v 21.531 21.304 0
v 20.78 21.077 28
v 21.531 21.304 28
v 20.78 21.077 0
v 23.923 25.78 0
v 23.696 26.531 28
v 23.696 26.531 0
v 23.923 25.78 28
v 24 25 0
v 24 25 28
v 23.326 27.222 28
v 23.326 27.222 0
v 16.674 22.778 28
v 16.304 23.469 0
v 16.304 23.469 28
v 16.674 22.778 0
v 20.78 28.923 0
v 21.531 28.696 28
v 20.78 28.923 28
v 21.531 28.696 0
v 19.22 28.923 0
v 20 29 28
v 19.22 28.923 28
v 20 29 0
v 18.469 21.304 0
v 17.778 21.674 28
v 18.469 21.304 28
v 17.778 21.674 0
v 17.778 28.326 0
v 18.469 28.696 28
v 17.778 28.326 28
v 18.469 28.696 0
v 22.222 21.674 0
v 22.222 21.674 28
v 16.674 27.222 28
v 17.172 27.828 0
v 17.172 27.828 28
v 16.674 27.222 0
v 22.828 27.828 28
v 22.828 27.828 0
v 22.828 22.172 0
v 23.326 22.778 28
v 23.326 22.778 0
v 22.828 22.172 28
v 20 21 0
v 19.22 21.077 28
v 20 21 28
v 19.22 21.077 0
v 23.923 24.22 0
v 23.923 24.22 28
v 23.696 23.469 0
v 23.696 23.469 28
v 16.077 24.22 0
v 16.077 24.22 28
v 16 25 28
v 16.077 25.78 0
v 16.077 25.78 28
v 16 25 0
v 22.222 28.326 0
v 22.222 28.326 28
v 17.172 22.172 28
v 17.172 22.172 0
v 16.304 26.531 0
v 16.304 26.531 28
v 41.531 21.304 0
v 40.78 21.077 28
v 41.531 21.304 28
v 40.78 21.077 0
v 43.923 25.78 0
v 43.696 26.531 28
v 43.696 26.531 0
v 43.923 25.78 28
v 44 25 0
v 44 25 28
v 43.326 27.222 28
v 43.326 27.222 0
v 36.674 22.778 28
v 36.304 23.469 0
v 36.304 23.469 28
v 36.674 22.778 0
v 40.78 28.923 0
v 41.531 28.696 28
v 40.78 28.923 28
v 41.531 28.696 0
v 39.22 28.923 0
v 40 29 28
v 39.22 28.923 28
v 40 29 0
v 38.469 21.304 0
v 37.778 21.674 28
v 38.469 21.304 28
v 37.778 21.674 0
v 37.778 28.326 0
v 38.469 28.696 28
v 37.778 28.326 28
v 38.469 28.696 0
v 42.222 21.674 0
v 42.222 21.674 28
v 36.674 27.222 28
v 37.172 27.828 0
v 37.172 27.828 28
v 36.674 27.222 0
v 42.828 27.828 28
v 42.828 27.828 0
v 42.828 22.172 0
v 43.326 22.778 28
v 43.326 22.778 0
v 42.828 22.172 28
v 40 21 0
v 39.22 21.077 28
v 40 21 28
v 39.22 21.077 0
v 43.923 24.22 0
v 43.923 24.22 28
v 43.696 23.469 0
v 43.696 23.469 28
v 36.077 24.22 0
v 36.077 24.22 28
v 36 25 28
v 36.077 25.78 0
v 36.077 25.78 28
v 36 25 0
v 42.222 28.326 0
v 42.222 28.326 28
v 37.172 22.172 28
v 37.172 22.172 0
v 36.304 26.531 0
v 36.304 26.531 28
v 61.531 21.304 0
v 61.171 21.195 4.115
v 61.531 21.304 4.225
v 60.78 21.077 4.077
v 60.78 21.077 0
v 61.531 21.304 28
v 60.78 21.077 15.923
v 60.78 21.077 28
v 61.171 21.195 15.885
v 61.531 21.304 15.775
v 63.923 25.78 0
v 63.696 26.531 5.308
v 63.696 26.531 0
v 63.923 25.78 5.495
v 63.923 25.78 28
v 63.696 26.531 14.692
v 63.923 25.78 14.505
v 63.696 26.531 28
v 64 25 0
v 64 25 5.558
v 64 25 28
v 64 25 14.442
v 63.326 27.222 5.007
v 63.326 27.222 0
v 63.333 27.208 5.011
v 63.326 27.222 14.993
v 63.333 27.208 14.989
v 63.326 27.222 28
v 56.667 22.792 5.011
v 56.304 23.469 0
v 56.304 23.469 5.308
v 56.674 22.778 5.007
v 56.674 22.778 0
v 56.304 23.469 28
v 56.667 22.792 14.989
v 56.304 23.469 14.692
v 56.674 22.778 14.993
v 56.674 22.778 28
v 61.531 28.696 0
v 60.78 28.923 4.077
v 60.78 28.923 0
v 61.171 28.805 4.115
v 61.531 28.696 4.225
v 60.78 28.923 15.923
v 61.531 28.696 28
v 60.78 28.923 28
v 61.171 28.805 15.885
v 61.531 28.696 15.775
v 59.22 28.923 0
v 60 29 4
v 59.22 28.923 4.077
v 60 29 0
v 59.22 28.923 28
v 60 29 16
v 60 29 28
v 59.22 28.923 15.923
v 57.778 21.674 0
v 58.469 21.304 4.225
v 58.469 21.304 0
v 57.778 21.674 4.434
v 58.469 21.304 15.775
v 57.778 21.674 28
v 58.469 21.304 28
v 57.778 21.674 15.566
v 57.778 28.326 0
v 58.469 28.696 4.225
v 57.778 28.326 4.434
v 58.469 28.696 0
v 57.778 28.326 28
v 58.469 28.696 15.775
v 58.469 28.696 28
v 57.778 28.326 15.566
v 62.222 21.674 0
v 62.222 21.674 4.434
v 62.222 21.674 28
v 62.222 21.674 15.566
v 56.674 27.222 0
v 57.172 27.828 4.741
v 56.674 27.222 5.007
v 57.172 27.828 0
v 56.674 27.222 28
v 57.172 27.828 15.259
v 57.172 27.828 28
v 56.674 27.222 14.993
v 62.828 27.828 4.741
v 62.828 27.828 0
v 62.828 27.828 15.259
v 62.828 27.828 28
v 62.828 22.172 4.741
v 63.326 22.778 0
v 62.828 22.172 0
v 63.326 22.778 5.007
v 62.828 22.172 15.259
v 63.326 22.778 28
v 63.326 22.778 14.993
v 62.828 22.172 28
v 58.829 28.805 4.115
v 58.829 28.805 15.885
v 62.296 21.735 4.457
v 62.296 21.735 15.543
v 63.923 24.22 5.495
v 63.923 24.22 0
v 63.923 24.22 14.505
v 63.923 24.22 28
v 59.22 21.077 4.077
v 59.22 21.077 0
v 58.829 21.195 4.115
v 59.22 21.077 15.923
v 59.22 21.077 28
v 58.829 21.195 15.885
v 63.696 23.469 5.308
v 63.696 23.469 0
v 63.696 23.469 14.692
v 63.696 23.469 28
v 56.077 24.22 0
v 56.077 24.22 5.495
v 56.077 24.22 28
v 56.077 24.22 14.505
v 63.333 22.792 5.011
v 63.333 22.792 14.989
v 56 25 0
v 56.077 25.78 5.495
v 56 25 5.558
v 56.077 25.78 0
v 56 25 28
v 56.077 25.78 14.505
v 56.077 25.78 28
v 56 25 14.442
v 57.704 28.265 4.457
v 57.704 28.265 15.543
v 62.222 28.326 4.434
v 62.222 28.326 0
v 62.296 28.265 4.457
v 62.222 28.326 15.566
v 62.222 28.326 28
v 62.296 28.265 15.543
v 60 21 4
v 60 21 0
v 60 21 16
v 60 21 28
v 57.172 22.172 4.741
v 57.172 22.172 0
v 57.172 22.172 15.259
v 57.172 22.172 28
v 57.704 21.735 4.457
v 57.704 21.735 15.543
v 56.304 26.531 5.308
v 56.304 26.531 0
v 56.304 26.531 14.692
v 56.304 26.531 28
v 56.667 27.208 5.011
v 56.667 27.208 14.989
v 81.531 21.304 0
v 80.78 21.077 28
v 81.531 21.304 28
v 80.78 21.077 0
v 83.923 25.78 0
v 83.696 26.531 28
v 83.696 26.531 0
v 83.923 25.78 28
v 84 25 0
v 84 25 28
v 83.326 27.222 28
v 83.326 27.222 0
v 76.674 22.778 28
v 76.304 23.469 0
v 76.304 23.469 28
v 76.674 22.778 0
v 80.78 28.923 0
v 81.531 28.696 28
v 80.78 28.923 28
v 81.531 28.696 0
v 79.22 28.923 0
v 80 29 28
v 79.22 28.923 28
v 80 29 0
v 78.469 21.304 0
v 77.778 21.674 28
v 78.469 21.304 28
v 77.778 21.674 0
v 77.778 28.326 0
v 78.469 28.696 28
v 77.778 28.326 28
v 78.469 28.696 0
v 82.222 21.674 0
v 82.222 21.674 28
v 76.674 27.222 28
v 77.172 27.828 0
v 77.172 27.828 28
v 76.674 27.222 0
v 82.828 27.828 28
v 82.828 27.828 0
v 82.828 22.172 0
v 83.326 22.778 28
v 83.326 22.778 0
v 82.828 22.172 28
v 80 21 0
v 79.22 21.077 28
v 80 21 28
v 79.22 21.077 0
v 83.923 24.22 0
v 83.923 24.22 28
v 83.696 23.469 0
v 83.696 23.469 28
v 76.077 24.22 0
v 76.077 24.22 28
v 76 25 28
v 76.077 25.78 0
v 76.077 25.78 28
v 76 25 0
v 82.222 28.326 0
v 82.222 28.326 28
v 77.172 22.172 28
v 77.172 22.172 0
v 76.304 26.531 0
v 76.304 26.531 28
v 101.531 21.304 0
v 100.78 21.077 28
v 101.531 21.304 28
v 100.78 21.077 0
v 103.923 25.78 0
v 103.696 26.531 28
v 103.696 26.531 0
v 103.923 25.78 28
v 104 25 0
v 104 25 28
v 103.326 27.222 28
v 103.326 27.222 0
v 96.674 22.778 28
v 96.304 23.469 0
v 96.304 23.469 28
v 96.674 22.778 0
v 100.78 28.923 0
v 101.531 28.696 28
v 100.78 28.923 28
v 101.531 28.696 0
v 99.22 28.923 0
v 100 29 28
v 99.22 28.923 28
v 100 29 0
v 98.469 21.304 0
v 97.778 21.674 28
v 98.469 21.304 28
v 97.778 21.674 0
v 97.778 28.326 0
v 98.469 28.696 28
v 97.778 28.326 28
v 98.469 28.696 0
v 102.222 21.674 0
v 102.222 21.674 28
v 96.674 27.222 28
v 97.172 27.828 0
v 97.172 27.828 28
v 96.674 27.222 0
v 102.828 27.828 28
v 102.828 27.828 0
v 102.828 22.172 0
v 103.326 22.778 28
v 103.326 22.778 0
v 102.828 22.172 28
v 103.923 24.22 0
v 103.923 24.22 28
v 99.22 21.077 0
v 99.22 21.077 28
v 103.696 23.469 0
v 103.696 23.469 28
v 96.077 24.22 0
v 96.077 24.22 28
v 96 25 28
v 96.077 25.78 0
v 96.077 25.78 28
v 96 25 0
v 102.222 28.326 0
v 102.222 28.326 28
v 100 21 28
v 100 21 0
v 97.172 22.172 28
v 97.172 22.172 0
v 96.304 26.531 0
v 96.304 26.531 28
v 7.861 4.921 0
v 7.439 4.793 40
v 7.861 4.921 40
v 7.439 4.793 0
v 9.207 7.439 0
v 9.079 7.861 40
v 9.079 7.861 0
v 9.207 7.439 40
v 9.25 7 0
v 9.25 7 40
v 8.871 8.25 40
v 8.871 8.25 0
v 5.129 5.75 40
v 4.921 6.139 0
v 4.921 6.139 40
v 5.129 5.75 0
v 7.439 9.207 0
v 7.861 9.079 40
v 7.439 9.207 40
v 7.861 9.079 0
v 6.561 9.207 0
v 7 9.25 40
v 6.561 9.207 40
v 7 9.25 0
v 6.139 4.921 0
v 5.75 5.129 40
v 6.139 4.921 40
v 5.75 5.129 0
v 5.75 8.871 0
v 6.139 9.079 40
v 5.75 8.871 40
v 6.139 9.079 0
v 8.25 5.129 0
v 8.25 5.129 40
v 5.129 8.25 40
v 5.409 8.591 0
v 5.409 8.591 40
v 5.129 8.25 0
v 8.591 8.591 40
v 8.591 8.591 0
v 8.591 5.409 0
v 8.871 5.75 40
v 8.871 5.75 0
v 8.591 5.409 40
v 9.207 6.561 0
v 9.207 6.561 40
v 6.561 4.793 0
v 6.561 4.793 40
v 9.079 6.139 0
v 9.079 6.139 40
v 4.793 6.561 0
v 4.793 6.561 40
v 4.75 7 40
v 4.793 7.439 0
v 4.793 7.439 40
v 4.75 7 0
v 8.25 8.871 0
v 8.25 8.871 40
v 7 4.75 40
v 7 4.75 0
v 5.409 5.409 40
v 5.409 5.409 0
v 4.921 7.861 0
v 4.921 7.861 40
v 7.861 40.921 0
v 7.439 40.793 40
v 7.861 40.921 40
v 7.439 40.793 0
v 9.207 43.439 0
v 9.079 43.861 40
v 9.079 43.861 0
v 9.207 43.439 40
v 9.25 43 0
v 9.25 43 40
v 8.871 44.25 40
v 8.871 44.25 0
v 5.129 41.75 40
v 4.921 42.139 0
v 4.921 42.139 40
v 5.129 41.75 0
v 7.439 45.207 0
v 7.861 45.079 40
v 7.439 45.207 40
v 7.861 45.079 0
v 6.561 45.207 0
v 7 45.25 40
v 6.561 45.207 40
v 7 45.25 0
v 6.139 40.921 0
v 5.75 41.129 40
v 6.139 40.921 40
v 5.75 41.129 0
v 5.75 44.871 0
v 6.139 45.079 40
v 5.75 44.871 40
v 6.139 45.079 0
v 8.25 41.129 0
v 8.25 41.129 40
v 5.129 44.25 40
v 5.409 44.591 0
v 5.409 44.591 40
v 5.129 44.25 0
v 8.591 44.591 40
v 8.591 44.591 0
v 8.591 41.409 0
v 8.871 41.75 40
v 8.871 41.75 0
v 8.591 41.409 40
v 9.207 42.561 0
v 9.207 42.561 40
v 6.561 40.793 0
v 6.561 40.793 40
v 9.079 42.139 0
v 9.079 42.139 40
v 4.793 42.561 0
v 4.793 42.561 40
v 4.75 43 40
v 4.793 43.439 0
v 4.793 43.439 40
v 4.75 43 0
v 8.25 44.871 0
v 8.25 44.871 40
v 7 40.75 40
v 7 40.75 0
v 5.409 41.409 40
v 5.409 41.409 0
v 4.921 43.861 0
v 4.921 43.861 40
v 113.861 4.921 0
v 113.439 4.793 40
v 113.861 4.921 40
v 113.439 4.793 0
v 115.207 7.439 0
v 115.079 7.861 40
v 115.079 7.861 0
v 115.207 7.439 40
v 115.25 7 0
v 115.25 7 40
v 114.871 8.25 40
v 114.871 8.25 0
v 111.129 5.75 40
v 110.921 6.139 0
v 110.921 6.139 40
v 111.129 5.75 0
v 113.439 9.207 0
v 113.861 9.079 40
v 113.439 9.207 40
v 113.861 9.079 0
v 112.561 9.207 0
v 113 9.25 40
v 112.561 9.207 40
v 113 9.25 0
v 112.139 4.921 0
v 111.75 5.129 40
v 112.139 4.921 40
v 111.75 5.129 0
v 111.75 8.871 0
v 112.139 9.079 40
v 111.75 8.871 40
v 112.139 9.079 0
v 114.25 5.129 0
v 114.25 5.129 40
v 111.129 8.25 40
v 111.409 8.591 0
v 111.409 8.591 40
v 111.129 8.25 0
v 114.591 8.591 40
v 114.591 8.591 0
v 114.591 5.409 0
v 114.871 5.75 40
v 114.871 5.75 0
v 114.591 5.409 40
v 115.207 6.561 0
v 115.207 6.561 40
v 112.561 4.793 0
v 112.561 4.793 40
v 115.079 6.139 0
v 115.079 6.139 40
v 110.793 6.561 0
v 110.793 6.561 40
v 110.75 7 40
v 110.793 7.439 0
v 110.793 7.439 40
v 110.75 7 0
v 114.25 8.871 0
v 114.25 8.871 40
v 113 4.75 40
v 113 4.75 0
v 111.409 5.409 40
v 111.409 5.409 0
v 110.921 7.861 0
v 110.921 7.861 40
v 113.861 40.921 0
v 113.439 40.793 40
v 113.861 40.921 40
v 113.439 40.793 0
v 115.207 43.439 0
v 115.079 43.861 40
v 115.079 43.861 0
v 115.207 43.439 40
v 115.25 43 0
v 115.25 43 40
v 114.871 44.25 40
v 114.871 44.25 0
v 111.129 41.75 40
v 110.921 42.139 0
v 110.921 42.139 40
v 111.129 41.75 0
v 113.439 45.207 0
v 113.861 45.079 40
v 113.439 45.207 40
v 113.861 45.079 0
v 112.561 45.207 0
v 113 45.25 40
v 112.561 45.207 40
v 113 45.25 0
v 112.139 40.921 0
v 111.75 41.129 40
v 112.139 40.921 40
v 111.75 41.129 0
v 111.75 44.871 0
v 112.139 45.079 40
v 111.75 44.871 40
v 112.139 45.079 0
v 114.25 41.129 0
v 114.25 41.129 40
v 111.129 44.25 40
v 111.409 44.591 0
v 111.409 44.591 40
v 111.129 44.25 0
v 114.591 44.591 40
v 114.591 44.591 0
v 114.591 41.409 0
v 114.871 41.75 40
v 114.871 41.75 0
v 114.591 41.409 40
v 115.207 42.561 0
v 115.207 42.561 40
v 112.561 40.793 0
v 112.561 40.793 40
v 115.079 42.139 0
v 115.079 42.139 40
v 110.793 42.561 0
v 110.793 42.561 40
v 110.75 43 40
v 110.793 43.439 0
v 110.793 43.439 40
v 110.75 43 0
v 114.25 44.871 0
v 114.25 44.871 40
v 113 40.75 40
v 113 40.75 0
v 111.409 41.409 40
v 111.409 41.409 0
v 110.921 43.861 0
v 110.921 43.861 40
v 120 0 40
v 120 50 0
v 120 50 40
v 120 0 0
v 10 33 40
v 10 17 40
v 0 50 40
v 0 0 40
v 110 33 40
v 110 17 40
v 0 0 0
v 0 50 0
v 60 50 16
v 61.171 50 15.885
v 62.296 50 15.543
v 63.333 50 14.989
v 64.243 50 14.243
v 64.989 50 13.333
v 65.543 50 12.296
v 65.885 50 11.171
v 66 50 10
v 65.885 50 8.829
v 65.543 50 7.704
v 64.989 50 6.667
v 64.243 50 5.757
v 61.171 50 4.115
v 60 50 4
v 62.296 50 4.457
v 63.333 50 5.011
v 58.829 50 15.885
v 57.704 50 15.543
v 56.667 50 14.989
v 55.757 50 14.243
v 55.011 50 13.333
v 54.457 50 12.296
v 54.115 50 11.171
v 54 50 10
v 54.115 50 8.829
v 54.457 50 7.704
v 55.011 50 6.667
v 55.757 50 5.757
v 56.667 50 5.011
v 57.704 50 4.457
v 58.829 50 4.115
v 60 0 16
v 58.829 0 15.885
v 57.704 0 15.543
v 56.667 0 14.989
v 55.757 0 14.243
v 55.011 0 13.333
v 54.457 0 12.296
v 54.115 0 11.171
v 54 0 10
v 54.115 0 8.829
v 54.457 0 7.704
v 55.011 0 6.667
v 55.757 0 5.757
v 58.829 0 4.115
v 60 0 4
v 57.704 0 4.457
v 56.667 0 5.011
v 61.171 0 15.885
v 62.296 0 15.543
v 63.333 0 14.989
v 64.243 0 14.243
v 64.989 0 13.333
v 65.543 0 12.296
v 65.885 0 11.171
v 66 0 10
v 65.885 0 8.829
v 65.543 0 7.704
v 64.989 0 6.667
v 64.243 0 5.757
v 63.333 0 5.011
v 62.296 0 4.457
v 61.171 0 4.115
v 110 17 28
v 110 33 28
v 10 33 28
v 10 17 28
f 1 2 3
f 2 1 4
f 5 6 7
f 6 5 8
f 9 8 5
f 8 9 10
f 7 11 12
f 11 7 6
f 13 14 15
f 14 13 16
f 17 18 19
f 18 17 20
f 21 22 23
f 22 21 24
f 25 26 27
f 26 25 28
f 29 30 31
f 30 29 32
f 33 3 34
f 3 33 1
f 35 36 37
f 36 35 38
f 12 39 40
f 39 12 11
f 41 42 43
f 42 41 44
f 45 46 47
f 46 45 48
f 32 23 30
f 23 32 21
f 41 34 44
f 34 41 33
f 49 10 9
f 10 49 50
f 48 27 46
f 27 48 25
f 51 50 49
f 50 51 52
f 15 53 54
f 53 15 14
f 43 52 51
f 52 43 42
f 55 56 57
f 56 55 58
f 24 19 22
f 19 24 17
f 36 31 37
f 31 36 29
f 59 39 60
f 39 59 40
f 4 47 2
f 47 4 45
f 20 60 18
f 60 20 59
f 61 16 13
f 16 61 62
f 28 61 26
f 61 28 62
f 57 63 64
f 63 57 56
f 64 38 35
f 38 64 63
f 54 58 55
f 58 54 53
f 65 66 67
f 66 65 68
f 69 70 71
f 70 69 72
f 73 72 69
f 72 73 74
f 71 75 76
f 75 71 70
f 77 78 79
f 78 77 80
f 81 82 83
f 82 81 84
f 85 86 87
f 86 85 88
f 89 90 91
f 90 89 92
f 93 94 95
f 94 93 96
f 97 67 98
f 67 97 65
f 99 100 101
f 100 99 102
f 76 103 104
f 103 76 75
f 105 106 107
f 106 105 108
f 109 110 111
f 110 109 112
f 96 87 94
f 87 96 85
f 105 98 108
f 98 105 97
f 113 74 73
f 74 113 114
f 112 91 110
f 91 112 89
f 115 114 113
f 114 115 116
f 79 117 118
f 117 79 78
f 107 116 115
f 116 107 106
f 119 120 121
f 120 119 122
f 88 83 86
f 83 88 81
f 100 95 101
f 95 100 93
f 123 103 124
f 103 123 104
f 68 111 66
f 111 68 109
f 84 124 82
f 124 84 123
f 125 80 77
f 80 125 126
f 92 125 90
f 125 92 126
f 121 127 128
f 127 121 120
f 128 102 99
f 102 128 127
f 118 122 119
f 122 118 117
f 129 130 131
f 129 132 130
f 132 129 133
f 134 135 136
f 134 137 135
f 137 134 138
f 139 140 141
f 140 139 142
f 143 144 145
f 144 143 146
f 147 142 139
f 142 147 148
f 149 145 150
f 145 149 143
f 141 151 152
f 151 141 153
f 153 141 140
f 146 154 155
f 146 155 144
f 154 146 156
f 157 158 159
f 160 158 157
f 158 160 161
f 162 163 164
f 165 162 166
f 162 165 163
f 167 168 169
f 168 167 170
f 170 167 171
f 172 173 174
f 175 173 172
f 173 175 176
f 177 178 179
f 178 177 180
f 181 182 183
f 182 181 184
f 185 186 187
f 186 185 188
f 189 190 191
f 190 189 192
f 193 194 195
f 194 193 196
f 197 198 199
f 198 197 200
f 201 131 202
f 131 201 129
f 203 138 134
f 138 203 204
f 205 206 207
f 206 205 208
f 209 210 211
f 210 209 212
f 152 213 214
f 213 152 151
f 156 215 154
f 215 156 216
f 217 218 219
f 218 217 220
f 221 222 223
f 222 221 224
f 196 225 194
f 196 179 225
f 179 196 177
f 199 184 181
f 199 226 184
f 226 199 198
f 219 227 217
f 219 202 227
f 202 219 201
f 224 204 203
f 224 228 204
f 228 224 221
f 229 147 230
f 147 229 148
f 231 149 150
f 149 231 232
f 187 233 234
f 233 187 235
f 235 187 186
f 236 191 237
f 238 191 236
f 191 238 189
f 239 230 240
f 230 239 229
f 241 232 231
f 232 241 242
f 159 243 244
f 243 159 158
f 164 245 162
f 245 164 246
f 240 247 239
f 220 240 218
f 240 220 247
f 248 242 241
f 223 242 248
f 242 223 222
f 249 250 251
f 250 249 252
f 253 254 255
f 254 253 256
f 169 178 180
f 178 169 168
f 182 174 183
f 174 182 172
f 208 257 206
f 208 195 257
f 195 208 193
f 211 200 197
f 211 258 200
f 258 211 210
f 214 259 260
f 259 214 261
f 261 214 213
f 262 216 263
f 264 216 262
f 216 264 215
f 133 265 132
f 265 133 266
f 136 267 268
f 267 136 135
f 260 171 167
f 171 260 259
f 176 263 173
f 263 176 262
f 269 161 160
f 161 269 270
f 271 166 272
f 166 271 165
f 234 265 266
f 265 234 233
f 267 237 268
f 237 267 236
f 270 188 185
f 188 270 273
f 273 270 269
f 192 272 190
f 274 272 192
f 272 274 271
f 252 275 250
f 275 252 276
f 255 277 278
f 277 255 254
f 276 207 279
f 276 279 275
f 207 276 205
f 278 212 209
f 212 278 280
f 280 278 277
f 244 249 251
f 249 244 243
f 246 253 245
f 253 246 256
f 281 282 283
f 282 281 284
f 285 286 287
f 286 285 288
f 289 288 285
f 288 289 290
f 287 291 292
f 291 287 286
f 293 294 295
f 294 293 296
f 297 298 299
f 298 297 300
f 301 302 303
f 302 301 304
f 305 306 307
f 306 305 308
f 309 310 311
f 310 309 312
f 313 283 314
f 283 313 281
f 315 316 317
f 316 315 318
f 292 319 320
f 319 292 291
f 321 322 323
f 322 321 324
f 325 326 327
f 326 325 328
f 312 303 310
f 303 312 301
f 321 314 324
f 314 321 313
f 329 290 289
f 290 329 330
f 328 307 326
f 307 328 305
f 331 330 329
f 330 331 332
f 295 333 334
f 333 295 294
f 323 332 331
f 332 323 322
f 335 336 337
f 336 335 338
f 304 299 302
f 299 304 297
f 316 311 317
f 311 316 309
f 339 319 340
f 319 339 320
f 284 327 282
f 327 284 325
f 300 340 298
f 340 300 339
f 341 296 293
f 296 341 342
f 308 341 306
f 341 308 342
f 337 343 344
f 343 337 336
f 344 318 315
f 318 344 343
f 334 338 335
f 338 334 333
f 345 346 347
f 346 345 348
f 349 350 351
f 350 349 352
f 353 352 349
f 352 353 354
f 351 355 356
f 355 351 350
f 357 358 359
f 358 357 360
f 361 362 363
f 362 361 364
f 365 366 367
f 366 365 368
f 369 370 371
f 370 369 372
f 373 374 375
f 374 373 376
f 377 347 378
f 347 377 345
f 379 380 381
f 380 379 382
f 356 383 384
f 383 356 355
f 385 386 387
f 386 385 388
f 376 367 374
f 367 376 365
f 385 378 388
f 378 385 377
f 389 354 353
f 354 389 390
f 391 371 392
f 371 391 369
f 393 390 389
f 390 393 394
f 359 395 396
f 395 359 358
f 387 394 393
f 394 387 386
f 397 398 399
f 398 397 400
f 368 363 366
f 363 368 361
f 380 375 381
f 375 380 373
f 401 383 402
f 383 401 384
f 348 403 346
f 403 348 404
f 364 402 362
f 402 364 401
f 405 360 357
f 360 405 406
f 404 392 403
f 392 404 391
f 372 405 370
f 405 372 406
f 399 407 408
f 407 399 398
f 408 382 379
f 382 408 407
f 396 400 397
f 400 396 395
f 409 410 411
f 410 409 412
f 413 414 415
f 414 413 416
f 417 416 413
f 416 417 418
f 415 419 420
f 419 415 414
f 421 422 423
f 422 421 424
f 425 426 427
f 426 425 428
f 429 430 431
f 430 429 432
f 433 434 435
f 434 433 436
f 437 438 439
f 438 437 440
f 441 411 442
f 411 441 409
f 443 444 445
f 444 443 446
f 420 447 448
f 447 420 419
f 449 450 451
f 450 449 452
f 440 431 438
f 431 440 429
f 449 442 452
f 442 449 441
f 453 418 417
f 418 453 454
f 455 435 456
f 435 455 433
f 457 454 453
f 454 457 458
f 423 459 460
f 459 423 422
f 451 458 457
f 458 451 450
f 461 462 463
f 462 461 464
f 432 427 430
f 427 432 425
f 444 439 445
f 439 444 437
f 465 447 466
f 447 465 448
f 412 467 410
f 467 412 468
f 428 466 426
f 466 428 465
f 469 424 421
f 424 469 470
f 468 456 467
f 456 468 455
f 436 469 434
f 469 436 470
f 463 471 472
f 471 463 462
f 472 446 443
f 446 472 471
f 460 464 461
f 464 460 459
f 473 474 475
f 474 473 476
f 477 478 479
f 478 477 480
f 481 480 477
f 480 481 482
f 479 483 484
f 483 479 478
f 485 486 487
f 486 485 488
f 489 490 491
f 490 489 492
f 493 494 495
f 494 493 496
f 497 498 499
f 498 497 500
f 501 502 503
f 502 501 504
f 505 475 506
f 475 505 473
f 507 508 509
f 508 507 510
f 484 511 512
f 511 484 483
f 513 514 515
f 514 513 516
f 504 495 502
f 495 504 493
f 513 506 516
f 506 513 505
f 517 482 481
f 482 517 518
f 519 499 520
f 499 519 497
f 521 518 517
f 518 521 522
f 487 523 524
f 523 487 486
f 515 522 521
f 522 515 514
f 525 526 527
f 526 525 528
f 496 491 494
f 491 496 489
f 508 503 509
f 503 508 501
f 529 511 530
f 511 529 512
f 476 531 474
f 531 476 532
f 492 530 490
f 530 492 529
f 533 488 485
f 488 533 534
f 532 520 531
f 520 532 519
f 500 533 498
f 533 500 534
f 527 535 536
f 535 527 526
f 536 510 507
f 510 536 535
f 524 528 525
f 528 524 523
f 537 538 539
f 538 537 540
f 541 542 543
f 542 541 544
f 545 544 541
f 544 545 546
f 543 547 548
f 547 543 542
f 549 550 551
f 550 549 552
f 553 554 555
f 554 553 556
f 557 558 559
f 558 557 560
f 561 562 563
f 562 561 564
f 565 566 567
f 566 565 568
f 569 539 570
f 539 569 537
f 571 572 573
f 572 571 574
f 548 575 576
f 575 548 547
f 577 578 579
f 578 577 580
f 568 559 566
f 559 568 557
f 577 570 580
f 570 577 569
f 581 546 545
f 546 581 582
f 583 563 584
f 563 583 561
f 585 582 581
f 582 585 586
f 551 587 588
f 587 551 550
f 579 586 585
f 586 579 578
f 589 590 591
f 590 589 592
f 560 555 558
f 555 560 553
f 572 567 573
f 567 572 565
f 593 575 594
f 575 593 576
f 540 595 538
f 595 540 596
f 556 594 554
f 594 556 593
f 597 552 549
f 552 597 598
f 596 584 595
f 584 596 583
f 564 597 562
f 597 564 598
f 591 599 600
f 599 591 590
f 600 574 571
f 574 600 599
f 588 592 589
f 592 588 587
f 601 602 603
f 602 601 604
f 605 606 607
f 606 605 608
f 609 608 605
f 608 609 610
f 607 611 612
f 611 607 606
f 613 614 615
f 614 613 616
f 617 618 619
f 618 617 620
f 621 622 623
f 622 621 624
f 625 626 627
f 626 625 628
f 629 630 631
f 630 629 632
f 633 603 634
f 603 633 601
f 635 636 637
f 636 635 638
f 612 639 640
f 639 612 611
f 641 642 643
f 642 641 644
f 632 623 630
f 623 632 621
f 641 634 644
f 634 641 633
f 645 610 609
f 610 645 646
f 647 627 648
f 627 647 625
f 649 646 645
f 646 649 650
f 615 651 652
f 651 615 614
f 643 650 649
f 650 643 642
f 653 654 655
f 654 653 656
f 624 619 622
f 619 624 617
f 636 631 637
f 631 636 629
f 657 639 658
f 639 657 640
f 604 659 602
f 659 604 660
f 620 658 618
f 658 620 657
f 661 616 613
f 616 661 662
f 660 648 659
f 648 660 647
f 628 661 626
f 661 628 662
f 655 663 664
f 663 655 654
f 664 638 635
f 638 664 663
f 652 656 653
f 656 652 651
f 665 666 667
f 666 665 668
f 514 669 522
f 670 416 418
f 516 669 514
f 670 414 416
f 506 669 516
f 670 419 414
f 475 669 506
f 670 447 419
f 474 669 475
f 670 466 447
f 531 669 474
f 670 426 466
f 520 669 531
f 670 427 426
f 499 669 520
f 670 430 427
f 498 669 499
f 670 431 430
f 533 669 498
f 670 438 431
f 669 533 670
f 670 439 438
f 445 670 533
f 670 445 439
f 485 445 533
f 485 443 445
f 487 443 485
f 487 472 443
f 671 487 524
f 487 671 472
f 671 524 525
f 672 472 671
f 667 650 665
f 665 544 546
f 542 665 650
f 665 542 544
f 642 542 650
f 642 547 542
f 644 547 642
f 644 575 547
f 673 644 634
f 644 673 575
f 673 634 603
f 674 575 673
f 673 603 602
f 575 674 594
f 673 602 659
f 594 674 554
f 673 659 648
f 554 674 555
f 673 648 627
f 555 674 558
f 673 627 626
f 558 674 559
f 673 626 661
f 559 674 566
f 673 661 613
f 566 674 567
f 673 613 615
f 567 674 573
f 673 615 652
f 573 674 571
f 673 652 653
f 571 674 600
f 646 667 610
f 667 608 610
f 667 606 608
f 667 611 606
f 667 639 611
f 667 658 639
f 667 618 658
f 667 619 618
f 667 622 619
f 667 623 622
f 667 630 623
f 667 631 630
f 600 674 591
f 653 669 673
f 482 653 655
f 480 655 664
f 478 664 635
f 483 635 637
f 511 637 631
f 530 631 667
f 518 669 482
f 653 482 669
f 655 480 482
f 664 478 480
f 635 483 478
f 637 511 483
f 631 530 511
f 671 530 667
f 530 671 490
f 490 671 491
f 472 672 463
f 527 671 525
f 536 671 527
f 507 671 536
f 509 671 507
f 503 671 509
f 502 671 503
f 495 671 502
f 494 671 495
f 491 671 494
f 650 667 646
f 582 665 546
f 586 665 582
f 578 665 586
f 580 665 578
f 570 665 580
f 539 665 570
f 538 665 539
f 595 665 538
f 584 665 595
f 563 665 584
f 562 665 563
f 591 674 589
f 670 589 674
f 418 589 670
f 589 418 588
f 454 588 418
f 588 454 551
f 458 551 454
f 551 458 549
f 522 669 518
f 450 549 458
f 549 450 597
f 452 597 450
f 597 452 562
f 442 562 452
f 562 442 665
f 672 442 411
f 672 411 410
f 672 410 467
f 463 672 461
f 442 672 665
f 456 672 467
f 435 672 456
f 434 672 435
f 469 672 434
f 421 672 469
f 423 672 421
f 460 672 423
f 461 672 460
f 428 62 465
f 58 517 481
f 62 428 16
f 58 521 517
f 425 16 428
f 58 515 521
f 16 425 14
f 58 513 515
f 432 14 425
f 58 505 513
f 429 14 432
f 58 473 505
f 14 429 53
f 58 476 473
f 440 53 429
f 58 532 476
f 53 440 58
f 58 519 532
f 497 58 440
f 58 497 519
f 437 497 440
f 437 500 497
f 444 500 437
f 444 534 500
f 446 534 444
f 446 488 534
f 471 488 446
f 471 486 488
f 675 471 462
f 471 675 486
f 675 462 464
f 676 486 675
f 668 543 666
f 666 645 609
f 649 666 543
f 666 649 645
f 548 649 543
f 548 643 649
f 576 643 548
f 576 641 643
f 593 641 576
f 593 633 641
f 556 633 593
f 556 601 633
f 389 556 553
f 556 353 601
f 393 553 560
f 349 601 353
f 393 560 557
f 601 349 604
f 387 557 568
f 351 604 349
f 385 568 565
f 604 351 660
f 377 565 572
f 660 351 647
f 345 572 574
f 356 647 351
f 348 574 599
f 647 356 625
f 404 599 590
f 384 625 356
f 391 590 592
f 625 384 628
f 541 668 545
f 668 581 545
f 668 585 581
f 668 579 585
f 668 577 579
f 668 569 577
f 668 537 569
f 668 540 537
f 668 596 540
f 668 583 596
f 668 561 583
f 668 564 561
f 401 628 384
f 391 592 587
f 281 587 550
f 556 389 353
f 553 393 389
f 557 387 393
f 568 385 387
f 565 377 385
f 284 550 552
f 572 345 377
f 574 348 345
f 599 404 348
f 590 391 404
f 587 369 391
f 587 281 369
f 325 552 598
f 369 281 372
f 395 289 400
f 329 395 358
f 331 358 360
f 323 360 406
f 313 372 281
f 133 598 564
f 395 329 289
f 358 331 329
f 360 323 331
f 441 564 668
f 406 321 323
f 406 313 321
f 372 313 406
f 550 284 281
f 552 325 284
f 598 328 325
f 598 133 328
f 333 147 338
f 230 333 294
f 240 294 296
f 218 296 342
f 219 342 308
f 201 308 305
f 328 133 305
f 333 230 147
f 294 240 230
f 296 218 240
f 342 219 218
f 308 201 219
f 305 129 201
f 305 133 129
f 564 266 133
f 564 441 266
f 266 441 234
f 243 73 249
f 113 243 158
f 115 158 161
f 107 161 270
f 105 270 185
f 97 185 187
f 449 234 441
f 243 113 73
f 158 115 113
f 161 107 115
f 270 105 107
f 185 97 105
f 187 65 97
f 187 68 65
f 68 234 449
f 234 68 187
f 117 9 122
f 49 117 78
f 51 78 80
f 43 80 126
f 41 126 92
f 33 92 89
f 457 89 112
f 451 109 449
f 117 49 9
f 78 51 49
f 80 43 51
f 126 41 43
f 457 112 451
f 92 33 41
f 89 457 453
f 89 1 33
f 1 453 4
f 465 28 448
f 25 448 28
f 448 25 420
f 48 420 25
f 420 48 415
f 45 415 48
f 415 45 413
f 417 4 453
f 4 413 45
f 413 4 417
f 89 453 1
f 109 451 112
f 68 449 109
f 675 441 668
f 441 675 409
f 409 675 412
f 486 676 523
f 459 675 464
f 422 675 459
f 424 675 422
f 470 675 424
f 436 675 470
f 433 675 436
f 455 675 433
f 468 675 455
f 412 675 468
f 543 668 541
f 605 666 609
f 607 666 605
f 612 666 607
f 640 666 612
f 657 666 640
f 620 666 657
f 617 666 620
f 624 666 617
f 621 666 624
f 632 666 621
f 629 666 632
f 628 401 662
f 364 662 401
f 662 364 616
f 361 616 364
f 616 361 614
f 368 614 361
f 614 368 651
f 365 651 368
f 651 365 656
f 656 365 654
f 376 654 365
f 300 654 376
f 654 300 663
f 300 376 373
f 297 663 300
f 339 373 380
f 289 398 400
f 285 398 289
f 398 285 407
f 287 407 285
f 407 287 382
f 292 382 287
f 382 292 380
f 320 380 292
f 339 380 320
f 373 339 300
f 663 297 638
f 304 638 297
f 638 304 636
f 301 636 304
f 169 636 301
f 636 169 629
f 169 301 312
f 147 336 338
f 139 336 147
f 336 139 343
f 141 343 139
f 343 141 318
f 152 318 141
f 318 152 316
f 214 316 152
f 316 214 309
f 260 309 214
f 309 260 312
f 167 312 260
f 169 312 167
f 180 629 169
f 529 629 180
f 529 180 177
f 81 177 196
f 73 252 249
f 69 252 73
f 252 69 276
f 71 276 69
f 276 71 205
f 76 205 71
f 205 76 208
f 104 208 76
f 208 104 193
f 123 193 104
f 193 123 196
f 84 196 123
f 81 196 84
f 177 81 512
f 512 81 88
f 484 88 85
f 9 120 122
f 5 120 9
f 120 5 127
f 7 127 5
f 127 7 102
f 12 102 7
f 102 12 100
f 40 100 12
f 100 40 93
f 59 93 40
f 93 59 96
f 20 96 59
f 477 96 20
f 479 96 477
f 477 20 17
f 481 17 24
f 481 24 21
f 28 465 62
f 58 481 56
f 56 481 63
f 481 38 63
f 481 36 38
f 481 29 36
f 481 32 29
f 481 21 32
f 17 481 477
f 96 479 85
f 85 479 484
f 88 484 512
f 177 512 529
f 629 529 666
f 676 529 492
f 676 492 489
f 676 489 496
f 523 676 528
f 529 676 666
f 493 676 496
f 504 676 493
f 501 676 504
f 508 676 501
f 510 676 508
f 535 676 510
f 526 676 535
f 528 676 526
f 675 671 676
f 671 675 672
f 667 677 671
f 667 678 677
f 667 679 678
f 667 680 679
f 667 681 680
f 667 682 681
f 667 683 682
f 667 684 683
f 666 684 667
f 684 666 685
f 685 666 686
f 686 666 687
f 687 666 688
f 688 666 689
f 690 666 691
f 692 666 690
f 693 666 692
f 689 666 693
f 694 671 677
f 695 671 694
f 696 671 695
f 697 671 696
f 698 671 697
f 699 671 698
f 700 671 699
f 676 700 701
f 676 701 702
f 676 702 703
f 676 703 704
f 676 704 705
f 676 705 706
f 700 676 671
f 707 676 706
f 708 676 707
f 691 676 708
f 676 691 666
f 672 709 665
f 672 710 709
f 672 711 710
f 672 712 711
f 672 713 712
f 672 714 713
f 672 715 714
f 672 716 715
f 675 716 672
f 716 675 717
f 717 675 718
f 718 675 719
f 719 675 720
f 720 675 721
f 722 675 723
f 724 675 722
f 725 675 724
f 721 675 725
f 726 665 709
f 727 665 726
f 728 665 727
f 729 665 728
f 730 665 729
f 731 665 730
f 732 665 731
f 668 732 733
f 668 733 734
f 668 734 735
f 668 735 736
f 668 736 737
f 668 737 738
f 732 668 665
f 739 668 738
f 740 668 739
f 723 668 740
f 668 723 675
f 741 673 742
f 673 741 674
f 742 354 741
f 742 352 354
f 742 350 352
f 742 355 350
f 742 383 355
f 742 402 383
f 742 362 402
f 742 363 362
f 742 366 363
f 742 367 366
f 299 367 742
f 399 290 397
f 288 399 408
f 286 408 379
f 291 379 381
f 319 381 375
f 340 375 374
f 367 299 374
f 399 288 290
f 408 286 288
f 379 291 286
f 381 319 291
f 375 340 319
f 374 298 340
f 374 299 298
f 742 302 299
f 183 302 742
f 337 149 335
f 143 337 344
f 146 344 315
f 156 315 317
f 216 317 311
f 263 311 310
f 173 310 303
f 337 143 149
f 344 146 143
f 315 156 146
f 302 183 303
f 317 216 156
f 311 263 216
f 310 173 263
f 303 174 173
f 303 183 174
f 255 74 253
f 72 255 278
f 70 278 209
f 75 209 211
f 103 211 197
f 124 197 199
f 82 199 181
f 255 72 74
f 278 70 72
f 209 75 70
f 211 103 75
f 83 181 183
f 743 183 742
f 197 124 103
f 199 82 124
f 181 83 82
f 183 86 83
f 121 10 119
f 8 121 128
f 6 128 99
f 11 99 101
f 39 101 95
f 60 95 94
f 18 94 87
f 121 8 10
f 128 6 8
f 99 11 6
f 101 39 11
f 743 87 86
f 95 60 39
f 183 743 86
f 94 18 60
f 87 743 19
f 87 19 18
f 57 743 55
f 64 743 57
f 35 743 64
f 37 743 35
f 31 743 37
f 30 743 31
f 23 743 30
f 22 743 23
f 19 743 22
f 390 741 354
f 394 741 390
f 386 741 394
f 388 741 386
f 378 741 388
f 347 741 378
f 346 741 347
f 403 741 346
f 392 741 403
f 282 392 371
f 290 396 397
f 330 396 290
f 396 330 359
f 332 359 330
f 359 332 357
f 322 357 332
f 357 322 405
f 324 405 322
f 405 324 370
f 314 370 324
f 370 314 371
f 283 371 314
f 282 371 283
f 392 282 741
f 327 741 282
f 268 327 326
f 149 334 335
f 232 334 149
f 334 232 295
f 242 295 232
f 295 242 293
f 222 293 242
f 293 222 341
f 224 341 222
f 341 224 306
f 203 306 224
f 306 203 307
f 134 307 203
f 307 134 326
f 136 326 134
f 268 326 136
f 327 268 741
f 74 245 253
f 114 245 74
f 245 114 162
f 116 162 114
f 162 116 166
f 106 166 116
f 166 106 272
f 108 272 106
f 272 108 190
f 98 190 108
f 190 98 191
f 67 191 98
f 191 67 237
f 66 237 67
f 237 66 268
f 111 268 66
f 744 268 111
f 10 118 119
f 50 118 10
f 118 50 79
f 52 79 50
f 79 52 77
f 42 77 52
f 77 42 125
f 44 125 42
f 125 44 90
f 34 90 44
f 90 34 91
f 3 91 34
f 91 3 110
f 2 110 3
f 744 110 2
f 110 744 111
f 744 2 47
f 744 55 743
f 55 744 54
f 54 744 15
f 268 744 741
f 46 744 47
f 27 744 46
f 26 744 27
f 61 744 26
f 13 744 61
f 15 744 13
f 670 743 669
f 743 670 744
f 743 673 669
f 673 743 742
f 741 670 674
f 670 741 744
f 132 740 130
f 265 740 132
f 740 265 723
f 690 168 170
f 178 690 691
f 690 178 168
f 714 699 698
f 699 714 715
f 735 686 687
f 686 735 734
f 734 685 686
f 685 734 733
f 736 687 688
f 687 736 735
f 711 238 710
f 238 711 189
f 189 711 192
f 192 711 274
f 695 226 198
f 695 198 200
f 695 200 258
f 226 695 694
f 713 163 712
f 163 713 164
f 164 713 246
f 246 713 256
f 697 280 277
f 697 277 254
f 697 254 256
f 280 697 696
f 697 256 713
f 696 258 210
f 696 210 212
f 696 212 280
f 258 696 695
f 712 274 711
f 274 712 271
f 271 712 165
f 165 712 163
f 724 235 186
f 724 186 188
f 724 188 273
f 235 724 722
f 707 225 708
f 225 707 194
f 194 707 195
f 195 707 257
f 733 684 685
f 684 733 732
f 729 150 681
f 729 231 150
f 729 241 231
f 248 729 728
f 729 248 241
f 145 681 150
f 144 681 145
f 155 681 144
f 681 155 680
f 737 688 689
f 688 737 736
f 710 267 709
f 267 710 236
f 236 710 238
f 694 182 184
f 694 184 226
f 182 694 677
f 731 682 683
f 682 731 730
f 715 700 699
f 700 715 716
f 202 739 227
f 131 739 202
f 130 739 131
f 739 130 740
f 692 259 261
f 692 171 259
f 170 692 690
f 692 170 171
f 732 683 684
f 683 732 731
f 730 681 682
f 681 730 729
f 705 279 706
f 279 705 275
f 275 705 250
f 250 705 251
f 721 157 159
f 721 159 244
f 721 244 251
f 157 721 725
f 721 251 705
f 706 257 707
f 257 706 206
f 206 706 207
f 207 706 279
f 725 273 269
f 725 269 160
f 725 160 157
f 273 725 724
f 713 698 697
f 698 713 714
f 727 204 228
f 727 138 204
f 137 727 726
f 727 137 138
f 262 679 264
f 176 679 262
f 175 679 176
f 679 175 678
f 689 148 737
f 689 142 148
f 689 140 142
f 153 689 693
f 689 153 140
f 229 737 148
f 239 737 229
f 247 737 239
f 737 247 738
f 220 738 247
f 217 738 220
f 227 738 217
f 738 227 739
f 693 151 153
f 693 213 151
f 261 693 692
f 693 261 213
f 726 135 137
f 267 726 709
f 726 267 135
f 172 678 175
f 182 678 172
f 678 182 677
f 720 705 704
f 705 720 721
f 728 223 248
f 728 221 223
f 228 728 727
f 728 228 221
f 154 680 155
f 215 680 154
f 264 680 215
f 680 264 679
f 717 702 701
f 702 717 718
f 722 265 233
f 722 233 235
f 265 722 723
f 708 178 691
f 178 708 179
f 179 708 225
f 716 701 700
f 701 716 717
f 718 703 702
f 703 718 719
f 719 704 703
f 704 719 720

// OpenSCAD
$fn = 32;

// ----------------------------------------------------------------------
// Manifold block: side_outlet manifold
// ----------------------------------------------------------------------

// --- parameters (mm) ---
block_l = 120;            // block length, X
block_w = 50;             // block width, Y
block_h = 40;             // block height, Z
port_d = 8;               // port bore diameter
port_pitch = 20;          // port pitch along X
gallery_d = 16;           // top gallery width, Y
gallery_depth = 12;       // gallery pocket depth
wall_p = 10;              // gallery end wall thickness, X
mnt_d = 4.5;              // mounting hole diameter
mnt_in = 7;               // mounting hole inset from the edges
out_d = 12;               // outlet bore diameter
out_z = 10;               // outlet axis height

n_ports = 5;  // ports in the row
port_x0 = (block_l - (n_ports - 1) * port_pitch) / 2;  // first port X

difference() {
  cube([block_l, block_w, block_h]);
  for (i = [0 : n_ports - 1])
    translate([port_x0 + i * port_pitch, block_w / 2, -1])
      cylinder(h = block_h + 2, d = port_d);
  translate([wall_p, block_w / 2 - gallery_d / 2, block_h - gallery_depth])
    cube([block_l - 2 * wall_p, gallery_d, gallery_depth + 1]);
  for (cx = [mnt_in, block_l - mnt_in])
    for (cy = [mnt_in, block_w - mnt_in])
      translate([cx, cy, -1]) cylinder(h = block_h + 2, d = mnt_d);
  translate([block_l / 2, -1, out_z]) rotate([-90, 0, 0])
    cylinder(h = block_w + 2, d = out_d);
}
